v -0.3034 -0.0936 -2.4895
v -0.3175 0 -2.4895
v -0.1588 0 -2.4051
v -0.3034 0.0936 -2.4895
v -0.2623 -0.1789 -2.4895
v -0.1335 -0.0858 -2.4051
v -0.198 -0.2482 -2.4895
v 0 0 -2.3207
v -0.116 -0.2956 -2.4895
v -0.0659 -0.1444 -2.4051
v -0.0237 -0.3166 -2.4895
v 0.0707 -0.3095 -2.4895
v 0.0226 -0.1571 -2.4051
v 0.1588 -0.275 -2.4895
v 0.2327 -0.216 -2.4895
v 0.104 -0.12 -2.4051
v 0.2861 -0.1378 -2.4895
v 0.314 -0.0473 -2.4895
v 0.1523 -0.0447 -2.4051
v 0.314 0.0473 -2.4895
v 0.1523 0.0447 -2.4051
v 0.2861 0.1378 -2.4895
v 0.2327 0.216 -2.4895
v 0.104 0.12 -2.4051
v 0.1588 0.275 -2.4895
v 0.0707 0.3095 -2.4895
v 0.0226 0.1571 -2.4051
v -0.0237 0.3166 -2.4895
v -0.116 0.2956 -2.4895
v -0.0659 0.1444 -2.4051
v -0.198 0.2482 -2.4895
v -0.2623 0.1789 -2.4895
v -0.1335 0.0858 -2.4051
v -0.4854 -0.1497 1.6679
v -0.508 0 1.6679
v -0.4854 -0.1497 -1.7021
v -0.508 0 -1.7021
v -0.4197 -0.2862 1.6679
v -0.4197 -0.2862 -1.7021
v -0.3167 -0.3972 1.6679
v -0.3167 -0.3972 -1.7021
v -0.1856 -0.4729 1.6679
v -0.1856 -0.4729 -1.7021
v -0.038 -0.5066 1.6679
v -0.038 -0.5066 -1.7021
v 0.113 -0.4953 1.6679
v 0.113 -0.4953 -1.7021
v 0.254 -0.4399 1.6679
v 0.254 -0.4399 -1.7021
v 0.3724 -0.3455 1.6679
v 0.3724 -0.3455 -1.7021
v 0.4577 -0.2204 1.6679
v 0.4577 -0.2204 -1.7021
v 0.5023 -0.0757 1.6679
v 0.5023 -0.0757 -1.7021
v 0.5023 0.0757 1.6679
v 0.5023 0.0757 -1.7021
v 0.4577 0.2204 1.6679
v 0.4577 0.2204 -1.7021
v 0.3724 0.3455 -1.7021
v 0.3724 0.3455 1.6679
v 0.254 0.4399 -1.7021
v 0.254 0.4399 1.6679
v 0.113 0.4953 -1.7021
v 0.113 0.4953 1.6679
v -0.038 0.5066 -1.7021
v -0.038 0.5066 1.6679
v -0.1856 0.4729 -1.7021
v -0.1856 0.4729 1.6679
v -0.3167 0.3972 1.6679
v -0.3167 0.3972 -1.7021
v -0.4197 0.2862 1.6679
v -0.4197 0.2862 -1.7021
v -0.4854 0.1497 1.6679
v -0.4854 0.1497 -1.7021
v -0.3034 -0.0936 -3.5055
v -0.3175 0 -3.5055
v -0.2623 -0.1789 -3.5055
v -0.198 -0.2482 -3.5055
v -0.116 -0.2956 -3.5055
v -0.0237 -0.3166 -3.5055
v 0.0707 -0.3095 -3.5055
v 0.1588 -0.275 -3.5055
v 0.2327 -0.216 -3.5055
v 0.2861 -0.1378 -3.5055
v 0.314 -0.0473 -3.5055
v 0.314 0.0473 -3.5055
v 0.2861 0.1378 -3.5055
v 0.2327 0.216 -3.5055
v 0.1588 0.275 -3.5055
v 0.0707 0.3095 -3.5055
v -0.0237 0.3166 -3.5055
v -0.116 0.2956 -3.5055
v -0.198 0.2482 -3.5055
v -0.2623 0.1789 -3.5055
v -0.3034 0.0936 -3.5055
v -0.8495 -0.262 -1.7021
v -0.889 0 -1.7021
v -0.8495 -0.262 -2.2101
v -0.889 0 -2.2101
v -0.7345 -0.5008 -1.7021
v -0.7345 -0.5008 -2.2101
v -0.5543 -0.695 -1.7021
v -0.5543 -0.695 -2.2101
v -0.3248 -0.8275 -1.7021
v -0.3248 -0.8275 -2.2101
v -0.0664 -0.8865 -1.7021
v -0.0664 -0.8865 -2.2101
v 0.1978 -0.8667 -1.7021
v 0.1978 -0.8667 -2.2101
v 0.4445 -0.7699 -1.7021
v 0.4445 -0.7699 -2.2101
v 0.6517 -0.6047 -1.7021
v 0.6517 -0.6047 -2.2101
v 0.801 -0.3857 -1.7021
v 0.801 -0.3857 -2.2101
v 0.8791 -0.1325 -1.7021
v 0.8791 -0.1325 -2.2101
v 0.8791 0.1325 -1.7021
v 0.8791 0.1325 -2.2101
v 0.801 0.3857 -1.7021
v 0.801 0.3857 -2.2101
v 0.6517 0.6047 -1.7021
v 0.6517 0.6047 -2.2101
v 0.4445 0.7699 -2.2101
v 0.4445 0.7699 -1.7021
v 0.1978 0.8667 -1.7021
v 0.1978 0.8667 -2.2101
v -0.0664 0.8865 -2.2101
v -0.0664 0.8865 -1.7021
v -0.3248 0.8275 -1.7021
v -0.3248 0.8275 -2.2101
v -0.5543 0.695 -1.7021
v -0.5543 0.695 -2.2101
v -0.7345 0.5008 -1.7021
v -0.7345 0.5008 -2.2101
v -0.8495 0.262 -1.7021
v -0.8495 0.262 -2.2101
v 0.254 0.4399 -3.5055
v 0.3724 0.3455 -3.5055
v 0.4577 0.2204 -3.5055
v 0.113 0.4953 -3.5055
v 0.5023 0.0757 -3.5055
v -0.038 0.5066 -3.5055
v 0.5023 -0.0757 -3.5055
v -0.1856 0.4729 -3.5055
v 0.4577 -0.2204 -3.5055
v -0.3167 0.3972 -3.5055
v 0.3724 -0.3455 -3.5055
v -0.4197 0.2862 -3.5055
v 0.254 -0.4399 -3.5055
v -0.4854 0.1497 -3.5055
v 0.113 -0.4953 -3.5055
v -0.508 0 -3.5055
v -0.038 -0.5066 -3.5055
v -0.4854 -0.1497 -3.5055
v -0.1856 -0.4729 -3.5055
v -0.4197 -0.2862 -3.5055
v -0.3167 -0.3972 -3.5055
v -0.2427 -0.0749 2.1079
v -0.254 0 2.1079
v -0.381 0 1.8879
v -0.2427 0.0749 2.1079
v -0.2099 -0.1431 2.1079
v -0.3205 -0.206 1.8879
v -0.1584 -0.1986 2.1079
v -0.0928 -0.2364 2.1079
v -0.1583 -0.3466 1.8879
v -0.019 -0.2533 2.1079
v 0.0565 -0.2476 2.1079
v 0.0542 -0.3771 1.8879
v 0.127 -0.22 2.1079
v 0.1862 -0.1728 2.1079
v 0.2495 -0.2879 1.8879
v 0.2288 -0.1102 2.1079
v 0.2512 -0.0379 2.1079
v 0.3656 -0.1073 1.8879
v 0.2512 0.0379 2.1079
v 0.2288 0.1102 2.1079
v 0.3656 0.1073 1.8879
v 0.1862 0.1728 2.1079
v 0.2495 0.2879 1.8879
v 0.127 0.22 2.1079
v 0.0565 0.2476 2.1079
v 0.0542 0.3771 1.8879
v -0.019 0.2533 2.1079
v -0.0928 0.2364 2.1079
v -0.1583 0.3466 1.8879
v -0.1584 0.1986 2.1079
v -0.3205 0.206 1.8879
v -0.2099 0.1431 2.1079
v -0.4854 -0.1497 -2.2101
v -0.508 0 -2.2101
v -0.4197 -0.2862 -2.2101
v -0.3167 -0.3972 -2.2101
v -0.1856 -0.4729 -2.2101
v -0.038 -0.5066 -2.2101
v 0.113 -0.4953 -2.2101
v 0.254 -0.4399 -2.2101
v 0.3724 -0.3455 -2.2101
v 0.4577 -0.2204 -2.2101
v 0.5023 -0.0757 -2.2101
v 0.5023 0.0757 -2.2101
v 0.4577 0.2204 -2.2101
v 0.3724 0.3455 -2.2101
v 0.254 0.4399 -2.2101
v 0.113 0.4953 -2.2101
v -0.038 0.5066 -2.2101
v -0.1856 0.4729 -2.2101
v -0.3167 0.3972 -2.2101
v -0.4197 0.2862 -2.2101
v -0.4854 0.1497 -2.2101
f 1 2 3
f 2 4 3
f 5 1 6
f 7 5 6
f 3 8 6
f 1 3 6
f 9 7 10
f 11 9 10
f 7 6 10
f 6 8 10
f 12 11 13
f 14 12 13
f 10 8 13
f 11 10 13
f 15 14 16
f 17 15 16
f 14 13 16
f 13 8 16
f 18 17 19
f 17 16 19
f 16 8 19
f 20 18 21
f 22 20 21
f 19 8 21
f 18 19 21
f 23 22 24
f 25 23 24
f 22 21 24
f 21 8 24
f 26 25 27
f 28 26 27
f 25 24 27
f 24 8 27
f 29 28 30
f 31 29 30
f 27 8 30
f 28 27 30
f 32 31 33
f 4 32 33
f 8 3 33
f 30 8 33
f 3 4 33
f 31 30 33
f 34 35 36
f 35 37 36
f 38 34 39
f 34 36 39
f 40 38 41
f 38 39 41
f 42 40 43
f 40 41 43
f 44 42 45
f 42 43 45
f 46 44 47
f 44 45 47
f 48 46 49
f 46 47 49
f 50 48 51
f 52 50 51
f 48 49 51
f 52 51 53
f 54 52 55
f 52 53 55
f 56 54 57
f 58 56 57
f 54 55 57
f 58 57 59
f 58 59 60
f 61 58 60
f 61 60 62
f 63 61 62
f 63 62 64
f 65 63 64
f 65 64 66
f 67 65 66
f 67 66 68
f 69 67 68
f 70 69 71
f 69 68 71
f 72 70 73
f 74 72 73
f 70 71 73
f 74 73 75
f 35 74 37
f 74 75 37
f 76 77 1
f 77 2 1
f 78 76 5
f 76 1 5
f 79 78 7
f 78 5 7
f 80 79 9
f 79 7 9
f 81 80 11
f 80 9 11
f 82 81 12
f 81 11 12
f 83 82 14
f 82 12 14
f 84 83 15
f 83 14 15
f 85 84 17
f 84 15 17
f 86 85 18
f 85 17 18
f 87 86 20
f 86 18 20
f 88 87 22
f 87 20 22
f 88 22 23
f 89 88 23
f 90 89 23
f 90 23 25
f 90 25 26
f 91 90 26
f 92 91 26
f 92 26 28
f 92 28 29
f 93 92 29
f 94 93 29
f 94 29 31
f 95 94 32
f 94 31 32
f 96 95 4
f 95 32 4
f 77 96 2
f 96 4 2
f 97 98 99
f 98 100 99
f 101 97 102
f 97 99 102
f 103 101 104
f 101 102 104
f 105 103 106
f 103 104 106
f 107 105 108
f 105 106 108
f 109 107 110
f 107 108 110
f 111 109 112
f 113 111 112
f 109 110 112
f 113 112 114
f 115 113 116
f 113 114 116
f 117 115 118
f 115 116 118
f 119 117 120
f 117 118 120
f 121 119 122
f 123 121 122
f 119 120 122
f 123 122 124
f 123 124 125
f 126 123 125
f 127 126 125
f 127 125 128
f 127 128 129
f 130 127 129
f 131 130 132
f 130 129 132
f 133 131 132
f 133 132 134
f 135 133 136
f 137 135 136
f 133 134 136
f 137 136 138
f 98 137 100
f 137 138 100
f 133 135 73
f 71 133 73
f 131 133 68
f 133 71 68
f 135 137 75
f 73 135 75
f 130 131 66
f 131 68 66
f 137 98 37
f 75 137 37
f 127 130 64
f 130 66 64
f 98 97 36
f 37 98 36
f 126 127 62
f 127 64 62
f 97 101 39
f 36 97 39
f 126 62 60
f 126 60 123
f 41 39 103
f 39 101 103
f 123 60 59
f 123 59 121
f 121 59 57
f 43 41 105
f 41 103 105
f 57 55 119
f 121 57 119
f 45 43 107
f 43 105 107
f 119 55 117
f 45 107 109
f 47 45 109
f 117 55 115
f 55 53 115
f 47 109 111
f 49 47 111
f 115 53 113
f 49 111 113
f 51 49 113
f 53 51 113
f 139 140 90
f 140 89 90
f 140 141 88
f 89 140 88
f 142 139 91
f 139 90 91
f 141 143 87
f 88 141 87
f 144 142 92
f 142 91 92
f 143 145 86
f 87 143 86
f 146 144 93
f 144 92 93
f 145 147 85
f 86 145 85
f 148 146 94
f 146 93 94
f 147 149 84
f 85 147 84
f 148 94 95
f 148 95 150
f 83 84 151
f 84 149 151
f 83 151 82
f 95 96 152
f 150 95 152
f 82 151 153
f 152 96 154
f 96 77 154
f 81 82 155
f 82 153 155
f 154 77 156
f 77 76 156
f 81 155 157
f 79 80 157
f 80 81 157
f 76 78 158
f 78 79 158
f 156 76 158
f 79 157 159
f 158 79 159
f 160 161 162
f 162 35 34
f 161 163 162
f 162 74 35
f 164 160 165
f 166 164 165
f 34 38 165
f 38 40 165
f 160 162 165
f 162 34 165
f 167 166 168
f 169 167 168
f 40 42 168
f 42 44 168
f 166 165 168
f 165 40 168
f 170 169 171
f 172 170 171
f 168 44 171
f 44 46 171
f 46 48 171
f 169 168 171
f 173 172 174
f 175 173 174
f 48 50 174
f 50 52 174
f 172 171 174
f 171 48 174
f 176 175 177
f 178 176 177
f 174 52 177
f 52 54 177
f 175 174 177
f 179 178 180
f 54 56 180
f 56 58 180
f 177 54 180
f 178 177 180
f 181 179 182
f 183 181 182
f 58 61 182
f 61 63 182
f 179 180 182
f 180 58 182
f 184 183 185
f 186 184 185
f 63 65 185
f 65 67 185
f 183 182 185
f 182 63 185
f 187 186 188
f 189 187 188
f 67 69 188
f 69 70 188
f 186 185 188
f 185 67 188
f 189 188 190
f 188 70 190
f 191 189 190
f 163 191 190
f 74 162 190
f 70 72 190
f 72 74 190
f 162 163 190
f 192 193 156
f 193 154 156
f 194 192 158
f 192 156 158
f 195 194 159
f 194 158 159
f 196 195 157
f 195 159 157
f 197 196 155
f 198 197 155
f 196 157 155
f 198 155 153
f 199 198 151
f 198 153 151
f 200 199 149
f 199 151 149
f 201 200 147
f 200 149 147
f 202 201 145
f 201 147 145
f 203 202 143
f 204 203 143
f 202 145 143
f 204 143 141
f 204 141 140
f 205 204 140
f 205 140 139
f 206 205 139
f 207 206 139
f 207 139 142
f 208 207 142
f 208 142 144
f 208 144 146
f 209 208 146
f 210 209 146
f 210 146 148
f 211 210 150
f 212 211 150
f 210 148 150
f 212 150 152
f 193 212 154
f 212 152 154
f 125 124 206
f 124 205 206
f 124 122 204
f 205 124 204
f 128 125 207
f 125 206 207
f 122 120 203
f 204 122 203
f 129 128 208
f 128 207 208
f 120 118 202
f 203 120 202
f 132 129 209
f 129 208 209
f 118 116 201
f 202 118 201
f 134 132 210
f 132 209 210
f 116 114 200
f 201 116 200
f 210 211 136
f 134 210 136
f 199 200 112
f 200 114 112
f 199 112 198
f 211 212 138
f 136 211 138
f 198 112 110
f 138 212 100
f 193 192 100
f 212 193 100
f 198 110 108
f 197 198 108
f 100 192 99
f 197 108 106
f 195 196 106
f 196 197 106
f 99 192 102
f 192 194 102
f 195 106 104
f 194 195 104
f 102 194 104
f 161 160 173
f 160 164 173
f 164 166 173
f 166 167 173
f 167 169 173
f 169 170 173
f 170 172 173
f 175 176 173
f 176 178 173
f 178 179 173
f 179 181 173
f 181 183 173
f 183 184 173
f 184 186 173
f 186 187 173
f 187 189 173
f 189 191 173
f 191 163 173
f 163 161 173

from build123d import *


with BuildPart() as part:
    # Sketch1 → Revolve1 (revolve)
    with BuildSketch(Plane(origin=(0, 0, 0), x_dir=(1, 0, 0), z_dir=(0, 1, 0)), mode=Mode.PRIVATE) as revolve1_sk:
        Polygon((0, 1.702109795), (0, -2.107890205), (0.254, -2.107890205), (0.508, -1.6679493), (0.508, 1.702109795), align=None)
        Polygon((0, 2.210109795), (0, 1.702109795), (0.508, 1.702109795), (0.889, 1.702109795), (0.889, 2.210109795), (0.508, 2.210109795), align=None)
        Polygon((0, 2.32069205), (0, 2.210109795), (0.508, 2.210109795), (0.508, 3.505509795), (0.3175, 3.505509795), (0.3175, 2.489509795), align=None)
    revolve(revolve1_sk.sketch.rotate(Axis((0, 0, -1.702109795), (0, 0, 1)), 180), axis=Axis((0, 0, -1.702109795), (0, 0, 1)))


solid = part.part
